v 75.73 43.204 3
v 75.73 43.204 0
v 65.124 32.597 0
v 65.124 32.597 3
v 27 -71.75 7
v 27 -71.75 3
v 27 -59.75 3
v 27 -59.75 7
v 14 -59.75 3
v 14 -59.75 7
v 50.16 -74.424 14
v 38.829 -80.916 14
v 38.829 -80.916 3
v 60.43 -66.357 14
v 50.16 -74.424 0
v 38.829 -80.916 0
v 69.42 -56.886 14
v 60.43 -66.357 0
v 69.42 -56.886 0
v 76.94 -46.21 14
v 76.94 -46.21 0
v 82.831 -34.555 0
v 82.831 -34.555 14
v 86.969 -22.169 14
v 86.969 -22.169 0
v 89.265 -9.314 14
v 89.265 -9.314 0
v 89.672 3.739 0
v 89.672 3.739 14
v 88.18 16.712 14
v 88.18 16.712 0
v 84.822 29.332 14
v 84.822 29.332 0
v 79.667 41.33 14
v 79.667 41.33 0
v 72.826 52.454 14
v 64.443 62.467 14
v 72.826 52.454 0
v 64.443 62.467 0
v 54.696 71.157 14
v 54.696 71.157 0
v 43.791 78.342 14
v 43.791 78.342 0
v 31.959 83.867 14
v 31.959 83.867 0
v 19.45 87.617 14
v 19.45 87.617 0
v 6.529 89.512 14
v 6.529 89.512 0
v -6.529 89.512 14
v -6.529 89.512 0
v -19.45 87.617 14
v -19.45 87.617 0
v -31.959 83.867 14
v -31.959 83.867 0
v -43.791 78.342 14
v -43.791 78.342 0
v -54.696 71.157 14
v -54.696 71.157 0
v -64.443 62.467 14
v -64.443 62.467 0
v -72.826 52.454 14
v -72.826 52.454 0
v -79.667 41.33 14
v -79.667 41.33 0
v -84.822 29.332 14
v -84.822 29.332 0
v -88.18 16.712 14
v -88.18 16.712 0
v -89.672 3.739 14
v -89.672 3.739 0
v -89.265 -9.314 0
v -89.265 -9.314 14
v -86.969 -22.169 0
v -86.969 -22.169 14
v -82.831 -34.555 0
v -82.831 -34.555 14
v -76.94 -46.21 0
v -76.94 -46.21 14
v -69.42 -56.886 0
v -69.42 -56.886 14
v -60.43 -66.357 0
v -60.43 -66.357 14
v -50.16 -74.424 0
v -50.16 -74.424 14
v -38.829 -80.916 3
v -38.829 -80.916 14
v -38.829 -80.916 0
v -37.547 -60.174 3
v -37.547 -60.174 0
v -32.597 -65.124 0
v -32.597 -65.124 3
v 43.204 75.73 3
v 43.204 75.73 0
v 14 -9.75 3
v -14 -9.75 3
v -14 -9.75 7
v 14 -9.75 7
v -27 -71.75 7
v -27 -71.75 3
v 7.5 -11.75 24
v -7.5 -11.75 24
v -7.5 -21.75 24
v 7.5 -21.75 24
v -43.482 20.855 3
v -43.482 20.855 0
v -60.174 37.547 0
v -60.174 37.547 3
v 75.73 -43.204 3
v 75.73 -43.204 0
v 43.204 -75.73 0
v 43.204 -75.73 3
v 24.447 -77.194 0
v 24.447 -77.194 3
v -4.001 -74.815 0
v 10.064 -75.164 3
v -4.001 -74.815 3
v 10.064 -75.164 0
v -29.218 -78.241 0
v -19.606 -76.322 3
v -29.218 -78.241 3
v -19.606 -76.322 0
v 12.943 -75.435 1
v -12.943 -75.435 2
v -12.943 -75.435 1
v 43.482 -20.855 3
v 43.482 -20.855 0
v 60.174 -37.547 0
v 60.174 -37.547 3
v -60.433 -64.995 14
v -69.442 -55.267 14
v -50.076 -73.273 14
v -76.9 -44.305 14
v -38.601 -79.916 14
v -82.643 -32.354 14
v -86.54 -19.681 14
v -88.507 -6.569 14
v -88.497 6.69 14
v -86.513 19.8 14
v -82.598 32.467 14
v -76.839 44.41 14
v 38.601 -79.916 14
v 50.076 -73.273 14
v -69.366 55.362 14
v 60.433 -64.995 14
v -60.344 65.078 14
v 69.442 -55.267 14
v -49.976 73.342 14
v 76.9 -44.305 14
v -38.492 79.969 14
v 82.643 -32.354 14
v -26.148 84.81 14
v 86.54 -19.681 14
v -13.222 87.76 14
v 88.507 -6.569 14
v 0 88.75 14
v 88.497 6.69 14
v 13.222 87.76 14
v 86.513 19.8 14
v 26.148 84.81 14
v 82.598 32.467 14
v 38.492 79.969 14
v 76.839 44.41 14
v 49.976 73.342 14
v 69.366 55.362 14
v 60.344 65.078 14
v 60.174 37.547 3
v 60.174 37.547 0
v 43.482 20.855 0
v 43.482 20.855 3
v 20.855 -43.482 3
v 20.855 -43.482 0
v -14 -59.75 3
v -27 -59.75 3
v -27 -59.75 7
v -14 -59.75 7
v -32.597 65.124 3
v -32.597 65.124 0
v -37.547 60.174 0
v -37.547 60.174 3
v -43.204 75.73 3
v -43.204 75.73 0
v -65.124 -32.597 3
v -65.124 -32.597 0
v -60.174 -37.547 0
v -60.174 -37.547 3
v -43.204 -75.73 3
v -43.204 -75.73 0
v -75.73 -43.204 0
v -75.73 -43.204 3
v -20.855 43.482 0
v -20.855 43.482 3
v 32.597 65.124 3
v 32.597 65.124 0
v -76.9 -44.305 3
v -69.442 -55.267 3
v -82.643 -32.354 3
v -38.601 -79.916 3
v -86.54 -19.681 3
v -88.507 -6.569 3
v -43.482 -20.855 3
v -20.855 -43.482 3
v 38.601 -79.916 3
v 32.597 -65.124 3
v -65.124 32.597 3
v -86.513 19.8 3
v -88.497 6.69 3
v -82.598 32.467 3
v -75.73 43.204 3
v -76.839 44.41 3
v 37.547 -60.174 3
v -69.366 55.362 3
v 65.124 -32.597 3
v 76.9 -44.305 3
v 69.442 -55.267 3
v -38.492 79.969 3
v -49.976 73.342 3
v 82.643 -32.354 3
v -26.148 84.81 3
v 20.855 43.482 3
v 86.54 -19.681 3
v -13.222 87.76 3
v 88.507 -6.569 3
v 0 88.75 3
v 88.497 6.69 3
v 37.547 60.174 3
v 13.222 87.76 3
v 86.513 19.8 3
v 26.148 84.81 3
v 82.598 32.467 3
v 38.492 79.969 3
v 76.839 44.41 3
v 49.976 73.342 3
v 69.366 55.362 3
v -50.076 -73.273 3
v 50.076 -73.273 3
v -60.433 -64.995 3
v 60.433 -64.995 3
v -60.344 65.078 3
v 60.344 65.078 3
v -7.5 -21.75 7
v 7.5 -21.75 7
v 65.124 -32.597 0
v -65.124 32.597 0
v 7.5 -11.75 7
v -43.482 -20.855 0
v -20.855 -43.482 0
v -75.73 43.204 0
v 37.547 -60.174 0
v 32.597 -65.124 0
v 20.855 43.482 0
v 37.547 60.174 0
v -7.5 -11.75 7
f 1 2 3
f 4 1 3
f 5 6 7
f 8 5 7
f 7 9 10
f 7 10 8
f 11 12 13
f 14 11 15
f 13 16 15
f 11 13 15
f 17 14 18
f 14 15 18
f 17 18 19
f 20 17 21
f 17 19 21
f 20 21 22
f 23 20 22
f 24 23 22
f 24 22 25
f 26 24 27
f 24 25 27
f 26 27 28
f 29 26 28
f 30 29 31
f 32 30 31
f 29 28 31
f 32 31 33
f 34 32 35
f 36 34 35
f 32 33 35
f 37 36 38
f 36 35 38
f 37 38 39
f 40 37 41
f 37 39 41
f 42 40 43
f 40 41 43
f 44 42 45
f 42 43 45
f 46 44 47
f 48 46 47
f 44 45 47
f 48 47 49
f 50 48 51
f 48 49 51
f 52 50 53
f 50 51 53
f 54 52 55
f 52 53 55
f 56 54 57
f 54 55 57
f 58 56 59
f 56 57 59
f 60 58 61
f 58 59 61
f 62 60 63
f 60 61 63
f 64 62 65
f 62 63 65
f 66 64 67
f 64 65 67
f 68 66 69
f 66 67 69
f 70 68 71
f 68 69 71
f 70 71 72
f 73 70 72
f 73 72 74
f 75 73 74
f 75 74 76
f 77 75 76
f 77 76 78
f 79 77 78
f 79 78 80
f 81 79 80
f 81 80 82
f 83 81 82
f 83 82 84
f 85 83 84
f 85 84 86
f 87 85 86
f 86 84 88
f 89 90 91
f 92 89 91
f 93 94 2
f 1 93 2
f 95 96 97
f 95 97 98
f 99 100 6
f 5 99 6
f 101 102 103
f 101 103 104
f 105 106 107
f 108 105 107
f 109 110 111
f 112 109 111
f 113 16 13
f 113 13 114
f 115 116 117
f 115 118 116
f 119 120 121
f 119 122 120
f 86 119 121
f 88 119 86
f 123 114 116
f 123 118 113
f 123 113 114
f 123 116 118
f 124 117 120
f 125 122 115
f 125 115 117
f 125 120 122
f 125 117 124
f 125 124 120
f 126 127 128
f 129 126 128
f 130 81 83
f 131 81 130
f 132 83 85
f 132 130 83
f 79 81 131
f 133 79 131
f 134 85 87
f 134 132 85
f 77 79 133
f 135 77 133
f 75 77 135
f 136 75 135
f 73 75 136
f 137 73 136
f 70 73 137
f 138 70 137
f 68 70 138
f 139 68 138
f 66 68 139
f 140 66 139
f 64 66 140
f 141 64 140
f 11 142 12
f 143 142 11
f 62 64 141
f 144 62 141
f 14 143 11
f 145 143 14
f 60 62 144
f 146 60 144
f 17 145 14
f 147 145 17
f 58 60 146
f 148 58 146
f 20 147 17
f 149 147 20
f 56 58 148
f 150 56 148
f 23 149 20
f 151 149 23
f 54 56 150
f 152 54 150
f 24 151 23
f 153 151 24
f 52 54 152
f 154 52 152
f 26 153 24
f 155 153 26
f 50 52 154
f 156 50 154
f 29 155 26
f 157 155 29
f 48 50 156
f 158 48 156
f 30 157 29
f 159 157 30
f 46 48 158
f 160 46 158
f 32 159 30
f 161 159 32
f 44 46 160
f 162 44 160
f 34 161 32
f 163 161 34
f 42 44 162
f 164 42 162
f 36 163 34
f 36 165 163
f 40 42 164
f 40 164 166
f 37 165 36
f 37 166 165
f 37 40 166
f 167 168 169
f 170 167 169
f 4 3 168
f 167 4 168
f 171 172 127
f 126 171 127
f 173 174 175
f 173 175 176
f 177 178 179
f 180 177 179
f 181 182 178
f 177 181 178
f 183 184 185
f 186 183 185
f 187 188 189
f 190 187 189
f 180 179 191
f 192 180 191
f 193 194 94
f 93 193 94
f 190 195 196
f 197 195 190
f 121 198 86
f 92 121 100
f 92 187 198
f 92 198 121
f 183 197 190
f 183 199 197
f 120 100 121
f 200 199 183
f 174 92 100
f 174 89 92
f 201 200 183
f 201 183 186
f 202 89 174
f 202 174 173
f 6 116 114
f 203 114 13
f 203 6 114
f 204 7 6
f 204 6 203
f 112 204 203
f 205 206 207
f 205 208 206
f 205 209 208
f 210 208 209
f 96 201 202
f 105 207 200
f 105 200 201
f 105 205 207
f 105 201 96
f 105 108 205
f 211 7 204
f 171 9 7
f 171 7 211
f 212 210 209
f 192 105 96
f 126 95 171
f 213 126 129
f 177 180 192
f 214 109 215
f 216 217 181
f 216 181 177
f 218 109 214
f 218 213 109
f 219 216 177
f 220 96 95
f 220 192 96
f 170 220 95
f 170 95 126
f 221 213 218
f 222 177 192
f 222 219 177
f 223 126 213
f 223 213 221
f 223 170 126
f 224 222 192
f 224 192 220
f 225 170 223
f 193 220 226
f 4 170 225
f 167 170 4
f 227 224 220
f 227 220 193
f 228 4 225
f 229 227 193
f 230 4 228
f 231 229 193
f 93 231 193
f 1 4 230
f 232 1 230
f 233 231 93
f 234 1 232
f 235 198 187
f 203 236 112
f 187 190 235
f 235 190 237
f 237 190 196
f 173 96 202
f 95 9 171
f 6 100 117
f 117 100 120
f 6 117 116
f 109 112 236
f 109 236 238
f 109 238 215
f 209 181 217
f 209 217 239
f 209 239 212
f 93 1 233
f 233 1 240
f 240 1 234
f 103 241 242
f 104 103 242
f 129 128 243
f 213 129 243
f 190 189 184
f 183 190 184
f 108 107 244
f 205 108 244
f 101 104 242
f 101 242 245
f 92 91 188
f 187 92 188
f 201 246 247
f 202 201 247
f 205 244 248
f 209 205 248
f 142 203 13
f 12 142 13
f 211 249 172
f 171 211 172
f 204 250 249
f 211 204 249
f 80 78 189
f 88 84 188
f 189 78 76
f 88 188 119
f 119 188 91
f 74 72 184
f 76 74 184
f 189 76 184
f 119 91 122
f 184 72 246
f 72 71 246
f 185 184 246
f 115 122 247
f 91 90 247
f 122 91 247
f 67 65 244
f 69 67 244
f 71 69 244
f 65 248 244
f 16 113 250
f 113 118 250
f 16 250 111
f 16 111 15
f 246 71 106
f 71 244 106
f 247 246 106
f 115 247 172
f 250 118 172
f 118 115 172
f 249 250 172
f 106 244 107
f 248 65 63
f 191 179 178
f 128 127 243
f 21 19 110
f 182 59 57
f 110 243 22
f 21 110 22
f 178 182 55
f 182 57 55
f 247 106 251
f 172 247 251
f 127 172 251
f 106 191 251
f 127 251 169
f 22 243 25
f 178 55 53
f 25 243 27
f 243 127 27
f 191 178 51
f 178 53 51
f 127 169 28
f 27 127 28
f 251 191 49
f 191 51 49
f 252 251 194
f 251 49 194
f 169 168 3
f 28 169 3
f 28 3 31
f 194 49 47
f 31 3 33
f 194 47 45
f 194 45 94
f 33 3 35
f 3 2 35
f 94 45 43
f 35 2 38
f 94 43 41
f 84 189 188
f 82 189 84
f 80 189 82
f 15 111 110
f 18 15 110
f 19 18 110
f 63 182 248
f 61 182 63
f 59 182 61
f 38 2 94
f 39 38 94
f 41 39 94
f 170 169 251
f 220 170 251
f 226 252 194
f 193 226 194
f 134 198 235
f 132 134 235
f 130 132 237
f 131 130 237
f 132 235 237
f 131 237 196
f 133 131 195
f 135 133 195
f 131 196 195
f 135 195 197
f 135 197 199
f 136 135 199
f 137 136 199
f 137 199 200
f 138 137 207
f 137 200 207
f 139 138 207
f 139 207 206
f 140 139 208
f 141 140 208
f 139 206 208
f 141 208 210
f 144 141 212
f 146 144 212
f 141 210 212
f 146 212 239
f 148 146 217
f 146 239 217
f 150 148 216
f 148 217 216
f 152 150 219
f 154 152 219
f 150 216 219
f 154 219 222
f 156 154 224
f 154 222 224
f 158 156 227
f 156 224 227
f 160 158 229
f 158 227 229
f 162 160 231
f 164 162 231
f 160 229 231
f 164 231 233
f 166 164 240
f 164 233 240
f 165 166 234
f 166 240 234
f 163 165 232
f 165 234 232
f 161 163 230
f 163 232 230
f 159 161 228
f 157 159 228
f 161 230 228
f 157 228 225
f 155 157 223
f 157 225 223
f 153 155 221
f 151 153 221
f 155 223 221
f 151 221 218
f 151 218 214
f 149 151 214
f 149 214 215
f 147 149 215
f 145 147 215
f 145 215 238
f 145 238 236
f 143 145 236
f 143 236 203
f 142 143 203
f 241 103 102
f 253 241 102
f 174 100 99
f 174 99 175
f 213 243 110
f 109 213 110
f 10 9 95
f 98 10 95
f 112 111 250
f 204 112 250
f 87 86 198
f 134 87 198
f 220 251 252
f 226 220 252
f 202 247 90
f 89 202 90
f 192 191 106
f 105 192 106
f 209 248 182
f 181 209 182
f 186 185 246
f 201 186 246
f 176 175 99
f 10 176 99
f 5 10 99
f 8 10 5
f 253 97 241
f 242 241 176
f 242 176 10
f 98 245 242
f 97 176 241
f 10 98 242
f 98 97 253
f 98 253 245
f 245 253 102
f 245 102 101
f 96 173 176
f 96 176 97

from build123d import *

# Parameters (mm, degrees)
BOSS_EXTRUDE1_DEPTH = 3
BOSS_EXTRUDE2_DEPTH = 11
SKETCH3_W           = 28
SKETCH3_H           = 50
SKETCH3_W_2         = 54
SKETCH3_H_2         = 12
BOSS_EXTRUDE3_DEPTH = 4
SKETCH4_W           = 15
SKETCH4_H           = 10
BOSS_EXTRUDE4_DEPTH = 17


with BuildPart() as part:
    # Model → Boss-Extrude1 (new body)
    with BuildSketch(Plane.XY):
        with BuildLine():
            ThreePointArc((38.829215393, -80.915724874), (0, 89.75), (-38.829215393, -80.915724874))
            add(Edge.make_bspline(
                [(38.829215393, -80.915724874), (12.943071798, -72.694758375), (-12.943071798, -72.694758375), (-38.829215393, -80.915724874)],
                knots=[0, 0, 0, 0, 1, 1, 1, 1], degree=3))
        make_face()
        Polygon((-20.854851634, -43.482268632), (-37.546710486, -60.174127484), (-32.596963018, -65.123874952), (-43.203564736, -75.73047667), (-75.73047667, -43.203564736), (-65.123874952, -32.596963018), (-60.174127484, -37.546710486), (-43.482268632, -20.854851634), align=None, mode=Mode.SUBTRACT)
        Polygon((43.482268632, -20.854851634), (60.174127484, -37.546710486), (65.123874952, -32.596963018), (75.73047667, -43.203564736), (43.203564736, -75.73047667), (32.596963018, -65.123874952), (37.546710486, -60.174127484), (20.854851634, -43.482268632), align=None, mode=Mode.SUBTRACT)
        Polygon((20.854851634, 43.482268632), (37.546710486, 60.174127484), (32.596963018, 65.123874952), (43.203564736, 75.73047667), (75.73047667, 43.203564736), (65.123874952, 32.596963018), (60.174127484, 37.546710486), (43.482268632, 20.854851634), align=None, mode=Mode.SUBTRACT)
        Polygon((-43.482268632, 20.854851634), (-60.174127484, 37.546710486), (-65.123874952, 32.596963018), (-75.73047667, 43.203564736), (-43.203564736, 75.73047667), (-32.596963018, 65.123874952), (-37.546710486, 60.174127484), (-20.854851634, 43.482268632), align=None, mode=Mode.SUBTRACT)
    extrude(amount=BOSS_EXTRUDE1_DEPTH)

    # Sketch2 → Boss-Extrude2 (add)
    with BuildSketch(Plane.XY.offset(3)):
        with BuildLine():
            Line((-38.829215393, -80.915724874), (-38.601028715, -79.915724874))
            ThreePointArc((-38.601028715, -79.915724874), (0, 88.75), (38.601028715, -79.915724874))
            Line((38.601028715, -79.915724874), (38.829215393, -80.915724874))
            ThreePointArc((38.829215393, -80.915724874), (0, 89.75), (-38.829215393, -80.915724874))
        make_face()
    extrude(amount=BOSS_EXTRUDE2_DEPTH)

    # Sketch3 → Boss-Extrude3 (add)
    with BuildSketch(Plane.XY.offset(3)):
        with Locations((0, -34.75)):
            Rectangle(SKETCH3_W, SKETCH3_H)
        with Locations((0, -65.75)):
            Rectangle(SKETCH3_W_2, SKETCH3_H_2)
    extrude(amount=BOSS_EXTRUDE3_DEPTH)

    # Sketch4 → Boss-Extrude4 (add)
    with BuildSketch(Plane.XY.offset(7)):
        with Locations((0, -16.75)):
            Rectangle(SKETCH4_W, SKETCH4_H)
    extrude(amount=BOSS_EXTRUDE4_DEPTH)


solid = part.part
